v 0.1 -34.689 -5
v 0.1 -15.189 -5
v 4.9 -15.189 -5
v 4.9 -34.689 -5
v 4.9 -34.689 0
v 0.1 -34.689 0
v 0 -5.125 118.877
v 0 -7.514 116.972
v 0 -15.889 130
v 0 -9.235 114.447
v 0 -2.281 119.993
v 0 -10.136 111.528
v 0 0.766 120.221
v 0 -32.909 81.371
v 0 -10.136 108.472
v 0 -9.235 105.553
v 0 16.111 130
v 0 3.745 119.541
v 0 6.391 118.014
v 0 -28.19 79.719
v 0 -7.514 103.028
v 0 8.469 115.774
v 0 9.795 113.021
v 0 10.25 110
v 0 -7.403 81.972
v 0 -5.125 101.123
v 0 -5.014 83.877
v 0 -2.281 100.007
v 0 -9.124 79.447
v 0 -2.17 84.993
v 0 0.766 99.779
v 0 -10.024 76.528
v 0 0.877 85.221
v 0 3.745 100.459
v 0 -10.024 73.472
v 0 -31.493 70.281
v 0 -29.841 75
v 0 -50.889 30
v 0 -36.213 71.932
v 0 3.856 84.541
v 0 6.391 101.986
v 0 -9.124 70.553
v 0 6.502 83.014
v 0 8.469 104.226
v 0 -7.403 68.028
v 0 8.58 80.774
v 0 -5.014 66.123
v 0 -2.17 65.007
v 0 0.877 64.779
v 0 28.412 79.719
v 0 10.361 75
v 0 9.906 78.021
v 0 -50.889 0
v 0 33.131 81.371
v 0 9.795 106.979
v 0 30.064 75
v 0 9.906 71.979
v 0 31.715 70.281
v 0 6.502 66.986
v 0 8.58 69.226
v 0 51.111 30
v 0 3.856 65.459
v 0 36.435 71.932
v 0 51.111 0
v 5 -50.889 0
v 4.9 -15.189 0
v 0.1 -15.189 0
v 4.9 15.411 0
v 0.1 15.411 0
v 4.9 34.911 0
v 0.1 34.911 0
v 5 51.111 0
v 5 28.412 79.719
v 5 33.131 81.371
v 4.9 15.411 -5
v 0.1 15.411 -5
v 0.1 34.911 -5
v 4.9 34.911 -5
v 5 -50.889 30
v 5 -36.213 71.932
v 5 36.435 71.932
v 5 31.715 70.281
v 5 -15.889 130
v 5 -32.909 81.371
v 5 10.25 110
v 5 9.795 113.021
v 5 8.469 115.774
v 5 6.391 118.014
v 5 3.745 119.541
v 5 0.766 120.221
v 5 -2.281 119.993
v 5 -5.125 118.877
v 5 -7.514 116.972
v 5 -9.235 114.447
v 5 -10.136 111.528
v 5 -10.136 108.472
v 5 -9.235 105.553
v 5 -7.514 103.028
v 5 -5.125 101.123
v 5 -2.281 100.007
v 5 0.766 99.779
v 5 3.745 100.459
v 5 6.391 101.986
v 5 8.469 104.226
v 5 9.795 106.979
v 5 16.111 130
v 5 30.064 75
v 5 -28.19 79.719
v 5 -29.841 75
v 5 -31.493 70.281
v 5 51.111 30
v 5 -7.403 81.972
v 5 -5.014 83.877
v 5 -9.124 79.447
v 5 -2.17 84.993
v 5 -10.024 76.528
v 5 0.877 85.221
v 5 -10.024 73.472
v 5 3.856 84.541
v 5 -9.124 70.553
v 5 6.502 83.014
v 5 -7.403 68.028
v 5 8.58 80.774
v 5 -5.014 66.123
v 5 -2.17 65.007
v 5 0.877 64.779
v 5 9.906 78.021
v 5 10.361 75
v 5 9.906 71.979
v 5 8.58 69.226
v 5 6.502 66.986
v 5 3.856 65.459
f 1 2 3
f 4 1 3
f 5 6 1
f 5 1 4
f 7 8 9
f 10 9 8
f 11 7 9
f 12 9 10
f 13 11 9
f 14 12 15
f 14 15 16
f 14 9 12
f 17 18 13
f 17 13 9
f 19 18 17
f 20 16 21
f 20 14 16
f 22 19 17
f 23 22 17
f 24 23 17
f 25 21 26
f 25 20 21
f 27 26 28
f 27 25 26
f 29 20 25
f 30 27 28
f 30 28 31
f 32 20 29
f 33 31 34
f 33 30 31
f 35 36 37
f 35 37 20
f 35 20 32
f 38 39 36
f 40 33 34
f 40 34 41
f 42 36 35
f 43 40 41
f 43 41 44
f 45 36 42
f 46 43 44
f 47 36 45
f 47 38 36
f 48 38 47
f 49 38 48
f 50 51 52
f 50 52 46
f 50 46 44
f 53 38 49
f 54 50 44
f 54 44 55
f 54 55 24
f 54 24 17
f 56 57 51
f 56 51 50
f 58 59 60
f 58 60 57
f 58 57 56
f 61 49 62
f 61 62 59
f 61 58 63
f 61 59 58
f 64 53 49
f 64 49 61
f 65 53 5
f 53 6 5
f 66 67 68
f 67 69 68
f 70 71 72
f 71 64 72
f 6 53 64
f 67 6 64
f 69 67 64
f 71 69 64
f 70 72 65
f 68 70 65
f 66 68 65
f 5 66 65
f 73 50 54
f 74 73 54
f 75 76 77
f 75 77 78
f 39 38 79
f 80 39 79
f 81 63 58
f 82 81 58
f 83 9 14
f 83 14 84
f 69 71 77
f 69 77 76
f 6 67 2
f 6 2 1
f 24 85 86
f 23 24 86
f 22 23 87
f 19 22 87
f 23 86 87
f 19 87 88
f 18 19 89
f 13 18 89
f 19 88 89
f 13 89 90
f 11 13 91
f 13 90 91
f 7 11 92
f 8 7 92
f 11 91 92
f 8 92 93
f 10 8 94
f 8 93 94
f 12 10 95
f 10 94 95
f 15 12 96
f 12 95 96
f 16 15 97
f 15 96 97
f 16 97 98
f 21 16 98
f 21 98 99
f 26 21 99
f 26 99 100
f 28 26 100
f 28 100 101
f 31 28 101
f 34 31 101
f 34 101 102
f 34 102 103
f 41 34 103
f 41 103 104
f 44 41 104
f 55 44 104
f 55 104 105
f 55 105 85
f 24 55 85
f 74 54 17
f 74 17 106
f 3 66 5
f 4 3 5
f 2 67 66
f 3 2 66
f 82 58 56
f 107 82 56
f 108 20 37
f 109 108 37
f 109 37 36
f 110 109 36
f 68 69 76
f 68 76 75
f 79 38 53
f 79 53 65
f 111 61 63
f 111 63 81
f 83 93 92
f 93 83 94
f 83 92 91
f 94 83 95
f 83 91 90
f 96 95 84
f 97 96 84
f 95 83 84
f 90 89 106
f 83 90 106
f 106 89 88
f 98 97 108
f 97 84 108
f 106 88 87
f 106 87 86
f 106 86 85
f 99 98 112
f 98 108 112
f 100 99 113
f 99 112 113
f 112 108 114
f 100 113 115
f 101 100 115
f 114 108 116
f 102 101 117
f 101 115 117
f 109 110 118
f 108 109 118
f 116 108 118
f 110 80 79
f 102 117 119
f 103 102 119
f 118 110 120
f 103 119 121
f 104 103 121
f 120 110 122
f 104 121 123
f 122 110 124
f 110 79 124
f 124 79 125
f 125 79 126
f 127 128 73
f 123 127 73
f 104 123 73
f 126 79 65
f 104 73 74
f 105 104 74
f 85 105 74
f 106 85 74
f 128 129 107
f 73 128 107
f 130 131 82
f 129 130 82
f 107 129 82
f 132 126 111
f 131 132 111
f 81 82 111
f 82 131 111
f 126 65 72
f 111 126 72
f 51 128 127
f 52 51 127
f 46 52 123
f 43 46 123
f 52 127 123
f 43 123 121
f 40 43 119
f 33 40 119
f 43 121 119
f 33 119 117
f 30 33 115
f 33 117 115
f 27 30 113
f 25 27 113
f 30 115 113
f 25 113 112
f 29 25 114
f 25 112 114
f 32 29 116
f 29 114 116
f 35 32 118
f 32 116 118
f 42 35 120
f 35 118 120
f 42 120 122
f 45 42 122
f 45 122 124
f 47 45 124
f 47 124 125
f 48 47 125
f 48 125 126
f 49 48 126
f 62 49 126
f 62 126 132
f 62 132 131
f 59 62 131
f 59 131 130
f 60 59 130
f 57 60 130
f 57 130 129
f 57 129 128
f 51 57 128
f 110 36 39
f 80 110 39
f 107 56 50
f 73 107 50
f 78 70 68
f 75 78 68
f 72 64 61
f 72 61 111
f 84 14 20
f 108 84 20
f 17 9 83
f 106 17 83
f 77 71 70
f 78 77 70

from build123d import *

# Parameters (mm, degrees)
F0_W     = 5
F0_H     = 102
F1_DEPTH = 130
F2_SIZE2 = 100
F2_SIZE  = 35
F4_W     = 4.8
F4_H     = 19.5
F5_DEPTH = 5
F6_D     = 20.5
F7_D     = 20.5
F8_DEPTH = 25


# Not quite as in the source:
# - a feature names something its author has since deleted; it is built from what else it names


with BuildPart() as f1:
    # F0 (on Top) → F1 (new body)
    with BuildSketch(Plane.XY):
        with Locations((2.5, 0.1111116846)):
            Rectangle(F0_W, F0_H)
    extrude(amount=F1_DEPTH)

    # F2
    f2_edges = [f1.edges().sort_by_distance(p)[0] for p in [
        (2.5, -50.888888, 130),
        (2.5, 51.111112, 130),
    ]]
    f2_side = f1.faces().sort_by_distance((2.5, 0.111112, 130))[0]
    chamfer(f2_edges, length=F2_SIZE, length2=F2_SIZE2, reference=f2_side)

    # F4 (on face) → F5 (join)
    with BuildSketch(Plane(origin=(0, 0, 0), x_dir=(1, 0, 0), z_dir=(0, 0, -1))):
        with Locations((2.5, -25.1611116846)):
            Rectangle(F4_W, F4_H)
        with Locations((2.5, 24.9388883154)):
            Rectangle(F4_W, F4_H)
    extrude(amount=F5_DEPTH)

    # F6 (through all)
    with Locations(Plane(origin=(0, 0, 0), x_dir=(0, -1, 0), z_dir=(-1, 0, 0))):
        with Locations((-0.1111116846, 75)):
            Hole(F6_D / 2)

    # F7 (through all)
    with Locations(Plane(origin=(0, 0, 0), x_dir=(0, -1, 0), z_dir=(-1, 0, 0))):
        with Locations((0, 110)):
            Hole(F7_D / 2)

    # F3 (on face) → F8 (cut)
    with BuildSketch(Plane(origin=(0, 0, 0), x_dir=(0, -1, 0), z_dir=(-1, 0, 0))):
        Polygon((-28.4119545359, 79.7192917818), (-33.1312463177, 81.3710439055), (-36.434750565, 71.9324603418), (-31.7154587832, 70.2807082182), (-30.0637066595, 75), align=None)
        Polygon((28.1897311666, 79.7192917818), (29.8414832903, 75), (34.5607750721, 76.6517521236), (32.9090229484, 81.3710439055), align=None)
        Polygon((34.5607750721, 76.6517521236), (29.8414832903, 75), (31.4932354139, 70.2807082182), (36.2125271957, 71.9324603418), align=None)
    extrude(amount=-F8_DEPTH, mode=Mode.SUBTRACT)


solid = f1.part
